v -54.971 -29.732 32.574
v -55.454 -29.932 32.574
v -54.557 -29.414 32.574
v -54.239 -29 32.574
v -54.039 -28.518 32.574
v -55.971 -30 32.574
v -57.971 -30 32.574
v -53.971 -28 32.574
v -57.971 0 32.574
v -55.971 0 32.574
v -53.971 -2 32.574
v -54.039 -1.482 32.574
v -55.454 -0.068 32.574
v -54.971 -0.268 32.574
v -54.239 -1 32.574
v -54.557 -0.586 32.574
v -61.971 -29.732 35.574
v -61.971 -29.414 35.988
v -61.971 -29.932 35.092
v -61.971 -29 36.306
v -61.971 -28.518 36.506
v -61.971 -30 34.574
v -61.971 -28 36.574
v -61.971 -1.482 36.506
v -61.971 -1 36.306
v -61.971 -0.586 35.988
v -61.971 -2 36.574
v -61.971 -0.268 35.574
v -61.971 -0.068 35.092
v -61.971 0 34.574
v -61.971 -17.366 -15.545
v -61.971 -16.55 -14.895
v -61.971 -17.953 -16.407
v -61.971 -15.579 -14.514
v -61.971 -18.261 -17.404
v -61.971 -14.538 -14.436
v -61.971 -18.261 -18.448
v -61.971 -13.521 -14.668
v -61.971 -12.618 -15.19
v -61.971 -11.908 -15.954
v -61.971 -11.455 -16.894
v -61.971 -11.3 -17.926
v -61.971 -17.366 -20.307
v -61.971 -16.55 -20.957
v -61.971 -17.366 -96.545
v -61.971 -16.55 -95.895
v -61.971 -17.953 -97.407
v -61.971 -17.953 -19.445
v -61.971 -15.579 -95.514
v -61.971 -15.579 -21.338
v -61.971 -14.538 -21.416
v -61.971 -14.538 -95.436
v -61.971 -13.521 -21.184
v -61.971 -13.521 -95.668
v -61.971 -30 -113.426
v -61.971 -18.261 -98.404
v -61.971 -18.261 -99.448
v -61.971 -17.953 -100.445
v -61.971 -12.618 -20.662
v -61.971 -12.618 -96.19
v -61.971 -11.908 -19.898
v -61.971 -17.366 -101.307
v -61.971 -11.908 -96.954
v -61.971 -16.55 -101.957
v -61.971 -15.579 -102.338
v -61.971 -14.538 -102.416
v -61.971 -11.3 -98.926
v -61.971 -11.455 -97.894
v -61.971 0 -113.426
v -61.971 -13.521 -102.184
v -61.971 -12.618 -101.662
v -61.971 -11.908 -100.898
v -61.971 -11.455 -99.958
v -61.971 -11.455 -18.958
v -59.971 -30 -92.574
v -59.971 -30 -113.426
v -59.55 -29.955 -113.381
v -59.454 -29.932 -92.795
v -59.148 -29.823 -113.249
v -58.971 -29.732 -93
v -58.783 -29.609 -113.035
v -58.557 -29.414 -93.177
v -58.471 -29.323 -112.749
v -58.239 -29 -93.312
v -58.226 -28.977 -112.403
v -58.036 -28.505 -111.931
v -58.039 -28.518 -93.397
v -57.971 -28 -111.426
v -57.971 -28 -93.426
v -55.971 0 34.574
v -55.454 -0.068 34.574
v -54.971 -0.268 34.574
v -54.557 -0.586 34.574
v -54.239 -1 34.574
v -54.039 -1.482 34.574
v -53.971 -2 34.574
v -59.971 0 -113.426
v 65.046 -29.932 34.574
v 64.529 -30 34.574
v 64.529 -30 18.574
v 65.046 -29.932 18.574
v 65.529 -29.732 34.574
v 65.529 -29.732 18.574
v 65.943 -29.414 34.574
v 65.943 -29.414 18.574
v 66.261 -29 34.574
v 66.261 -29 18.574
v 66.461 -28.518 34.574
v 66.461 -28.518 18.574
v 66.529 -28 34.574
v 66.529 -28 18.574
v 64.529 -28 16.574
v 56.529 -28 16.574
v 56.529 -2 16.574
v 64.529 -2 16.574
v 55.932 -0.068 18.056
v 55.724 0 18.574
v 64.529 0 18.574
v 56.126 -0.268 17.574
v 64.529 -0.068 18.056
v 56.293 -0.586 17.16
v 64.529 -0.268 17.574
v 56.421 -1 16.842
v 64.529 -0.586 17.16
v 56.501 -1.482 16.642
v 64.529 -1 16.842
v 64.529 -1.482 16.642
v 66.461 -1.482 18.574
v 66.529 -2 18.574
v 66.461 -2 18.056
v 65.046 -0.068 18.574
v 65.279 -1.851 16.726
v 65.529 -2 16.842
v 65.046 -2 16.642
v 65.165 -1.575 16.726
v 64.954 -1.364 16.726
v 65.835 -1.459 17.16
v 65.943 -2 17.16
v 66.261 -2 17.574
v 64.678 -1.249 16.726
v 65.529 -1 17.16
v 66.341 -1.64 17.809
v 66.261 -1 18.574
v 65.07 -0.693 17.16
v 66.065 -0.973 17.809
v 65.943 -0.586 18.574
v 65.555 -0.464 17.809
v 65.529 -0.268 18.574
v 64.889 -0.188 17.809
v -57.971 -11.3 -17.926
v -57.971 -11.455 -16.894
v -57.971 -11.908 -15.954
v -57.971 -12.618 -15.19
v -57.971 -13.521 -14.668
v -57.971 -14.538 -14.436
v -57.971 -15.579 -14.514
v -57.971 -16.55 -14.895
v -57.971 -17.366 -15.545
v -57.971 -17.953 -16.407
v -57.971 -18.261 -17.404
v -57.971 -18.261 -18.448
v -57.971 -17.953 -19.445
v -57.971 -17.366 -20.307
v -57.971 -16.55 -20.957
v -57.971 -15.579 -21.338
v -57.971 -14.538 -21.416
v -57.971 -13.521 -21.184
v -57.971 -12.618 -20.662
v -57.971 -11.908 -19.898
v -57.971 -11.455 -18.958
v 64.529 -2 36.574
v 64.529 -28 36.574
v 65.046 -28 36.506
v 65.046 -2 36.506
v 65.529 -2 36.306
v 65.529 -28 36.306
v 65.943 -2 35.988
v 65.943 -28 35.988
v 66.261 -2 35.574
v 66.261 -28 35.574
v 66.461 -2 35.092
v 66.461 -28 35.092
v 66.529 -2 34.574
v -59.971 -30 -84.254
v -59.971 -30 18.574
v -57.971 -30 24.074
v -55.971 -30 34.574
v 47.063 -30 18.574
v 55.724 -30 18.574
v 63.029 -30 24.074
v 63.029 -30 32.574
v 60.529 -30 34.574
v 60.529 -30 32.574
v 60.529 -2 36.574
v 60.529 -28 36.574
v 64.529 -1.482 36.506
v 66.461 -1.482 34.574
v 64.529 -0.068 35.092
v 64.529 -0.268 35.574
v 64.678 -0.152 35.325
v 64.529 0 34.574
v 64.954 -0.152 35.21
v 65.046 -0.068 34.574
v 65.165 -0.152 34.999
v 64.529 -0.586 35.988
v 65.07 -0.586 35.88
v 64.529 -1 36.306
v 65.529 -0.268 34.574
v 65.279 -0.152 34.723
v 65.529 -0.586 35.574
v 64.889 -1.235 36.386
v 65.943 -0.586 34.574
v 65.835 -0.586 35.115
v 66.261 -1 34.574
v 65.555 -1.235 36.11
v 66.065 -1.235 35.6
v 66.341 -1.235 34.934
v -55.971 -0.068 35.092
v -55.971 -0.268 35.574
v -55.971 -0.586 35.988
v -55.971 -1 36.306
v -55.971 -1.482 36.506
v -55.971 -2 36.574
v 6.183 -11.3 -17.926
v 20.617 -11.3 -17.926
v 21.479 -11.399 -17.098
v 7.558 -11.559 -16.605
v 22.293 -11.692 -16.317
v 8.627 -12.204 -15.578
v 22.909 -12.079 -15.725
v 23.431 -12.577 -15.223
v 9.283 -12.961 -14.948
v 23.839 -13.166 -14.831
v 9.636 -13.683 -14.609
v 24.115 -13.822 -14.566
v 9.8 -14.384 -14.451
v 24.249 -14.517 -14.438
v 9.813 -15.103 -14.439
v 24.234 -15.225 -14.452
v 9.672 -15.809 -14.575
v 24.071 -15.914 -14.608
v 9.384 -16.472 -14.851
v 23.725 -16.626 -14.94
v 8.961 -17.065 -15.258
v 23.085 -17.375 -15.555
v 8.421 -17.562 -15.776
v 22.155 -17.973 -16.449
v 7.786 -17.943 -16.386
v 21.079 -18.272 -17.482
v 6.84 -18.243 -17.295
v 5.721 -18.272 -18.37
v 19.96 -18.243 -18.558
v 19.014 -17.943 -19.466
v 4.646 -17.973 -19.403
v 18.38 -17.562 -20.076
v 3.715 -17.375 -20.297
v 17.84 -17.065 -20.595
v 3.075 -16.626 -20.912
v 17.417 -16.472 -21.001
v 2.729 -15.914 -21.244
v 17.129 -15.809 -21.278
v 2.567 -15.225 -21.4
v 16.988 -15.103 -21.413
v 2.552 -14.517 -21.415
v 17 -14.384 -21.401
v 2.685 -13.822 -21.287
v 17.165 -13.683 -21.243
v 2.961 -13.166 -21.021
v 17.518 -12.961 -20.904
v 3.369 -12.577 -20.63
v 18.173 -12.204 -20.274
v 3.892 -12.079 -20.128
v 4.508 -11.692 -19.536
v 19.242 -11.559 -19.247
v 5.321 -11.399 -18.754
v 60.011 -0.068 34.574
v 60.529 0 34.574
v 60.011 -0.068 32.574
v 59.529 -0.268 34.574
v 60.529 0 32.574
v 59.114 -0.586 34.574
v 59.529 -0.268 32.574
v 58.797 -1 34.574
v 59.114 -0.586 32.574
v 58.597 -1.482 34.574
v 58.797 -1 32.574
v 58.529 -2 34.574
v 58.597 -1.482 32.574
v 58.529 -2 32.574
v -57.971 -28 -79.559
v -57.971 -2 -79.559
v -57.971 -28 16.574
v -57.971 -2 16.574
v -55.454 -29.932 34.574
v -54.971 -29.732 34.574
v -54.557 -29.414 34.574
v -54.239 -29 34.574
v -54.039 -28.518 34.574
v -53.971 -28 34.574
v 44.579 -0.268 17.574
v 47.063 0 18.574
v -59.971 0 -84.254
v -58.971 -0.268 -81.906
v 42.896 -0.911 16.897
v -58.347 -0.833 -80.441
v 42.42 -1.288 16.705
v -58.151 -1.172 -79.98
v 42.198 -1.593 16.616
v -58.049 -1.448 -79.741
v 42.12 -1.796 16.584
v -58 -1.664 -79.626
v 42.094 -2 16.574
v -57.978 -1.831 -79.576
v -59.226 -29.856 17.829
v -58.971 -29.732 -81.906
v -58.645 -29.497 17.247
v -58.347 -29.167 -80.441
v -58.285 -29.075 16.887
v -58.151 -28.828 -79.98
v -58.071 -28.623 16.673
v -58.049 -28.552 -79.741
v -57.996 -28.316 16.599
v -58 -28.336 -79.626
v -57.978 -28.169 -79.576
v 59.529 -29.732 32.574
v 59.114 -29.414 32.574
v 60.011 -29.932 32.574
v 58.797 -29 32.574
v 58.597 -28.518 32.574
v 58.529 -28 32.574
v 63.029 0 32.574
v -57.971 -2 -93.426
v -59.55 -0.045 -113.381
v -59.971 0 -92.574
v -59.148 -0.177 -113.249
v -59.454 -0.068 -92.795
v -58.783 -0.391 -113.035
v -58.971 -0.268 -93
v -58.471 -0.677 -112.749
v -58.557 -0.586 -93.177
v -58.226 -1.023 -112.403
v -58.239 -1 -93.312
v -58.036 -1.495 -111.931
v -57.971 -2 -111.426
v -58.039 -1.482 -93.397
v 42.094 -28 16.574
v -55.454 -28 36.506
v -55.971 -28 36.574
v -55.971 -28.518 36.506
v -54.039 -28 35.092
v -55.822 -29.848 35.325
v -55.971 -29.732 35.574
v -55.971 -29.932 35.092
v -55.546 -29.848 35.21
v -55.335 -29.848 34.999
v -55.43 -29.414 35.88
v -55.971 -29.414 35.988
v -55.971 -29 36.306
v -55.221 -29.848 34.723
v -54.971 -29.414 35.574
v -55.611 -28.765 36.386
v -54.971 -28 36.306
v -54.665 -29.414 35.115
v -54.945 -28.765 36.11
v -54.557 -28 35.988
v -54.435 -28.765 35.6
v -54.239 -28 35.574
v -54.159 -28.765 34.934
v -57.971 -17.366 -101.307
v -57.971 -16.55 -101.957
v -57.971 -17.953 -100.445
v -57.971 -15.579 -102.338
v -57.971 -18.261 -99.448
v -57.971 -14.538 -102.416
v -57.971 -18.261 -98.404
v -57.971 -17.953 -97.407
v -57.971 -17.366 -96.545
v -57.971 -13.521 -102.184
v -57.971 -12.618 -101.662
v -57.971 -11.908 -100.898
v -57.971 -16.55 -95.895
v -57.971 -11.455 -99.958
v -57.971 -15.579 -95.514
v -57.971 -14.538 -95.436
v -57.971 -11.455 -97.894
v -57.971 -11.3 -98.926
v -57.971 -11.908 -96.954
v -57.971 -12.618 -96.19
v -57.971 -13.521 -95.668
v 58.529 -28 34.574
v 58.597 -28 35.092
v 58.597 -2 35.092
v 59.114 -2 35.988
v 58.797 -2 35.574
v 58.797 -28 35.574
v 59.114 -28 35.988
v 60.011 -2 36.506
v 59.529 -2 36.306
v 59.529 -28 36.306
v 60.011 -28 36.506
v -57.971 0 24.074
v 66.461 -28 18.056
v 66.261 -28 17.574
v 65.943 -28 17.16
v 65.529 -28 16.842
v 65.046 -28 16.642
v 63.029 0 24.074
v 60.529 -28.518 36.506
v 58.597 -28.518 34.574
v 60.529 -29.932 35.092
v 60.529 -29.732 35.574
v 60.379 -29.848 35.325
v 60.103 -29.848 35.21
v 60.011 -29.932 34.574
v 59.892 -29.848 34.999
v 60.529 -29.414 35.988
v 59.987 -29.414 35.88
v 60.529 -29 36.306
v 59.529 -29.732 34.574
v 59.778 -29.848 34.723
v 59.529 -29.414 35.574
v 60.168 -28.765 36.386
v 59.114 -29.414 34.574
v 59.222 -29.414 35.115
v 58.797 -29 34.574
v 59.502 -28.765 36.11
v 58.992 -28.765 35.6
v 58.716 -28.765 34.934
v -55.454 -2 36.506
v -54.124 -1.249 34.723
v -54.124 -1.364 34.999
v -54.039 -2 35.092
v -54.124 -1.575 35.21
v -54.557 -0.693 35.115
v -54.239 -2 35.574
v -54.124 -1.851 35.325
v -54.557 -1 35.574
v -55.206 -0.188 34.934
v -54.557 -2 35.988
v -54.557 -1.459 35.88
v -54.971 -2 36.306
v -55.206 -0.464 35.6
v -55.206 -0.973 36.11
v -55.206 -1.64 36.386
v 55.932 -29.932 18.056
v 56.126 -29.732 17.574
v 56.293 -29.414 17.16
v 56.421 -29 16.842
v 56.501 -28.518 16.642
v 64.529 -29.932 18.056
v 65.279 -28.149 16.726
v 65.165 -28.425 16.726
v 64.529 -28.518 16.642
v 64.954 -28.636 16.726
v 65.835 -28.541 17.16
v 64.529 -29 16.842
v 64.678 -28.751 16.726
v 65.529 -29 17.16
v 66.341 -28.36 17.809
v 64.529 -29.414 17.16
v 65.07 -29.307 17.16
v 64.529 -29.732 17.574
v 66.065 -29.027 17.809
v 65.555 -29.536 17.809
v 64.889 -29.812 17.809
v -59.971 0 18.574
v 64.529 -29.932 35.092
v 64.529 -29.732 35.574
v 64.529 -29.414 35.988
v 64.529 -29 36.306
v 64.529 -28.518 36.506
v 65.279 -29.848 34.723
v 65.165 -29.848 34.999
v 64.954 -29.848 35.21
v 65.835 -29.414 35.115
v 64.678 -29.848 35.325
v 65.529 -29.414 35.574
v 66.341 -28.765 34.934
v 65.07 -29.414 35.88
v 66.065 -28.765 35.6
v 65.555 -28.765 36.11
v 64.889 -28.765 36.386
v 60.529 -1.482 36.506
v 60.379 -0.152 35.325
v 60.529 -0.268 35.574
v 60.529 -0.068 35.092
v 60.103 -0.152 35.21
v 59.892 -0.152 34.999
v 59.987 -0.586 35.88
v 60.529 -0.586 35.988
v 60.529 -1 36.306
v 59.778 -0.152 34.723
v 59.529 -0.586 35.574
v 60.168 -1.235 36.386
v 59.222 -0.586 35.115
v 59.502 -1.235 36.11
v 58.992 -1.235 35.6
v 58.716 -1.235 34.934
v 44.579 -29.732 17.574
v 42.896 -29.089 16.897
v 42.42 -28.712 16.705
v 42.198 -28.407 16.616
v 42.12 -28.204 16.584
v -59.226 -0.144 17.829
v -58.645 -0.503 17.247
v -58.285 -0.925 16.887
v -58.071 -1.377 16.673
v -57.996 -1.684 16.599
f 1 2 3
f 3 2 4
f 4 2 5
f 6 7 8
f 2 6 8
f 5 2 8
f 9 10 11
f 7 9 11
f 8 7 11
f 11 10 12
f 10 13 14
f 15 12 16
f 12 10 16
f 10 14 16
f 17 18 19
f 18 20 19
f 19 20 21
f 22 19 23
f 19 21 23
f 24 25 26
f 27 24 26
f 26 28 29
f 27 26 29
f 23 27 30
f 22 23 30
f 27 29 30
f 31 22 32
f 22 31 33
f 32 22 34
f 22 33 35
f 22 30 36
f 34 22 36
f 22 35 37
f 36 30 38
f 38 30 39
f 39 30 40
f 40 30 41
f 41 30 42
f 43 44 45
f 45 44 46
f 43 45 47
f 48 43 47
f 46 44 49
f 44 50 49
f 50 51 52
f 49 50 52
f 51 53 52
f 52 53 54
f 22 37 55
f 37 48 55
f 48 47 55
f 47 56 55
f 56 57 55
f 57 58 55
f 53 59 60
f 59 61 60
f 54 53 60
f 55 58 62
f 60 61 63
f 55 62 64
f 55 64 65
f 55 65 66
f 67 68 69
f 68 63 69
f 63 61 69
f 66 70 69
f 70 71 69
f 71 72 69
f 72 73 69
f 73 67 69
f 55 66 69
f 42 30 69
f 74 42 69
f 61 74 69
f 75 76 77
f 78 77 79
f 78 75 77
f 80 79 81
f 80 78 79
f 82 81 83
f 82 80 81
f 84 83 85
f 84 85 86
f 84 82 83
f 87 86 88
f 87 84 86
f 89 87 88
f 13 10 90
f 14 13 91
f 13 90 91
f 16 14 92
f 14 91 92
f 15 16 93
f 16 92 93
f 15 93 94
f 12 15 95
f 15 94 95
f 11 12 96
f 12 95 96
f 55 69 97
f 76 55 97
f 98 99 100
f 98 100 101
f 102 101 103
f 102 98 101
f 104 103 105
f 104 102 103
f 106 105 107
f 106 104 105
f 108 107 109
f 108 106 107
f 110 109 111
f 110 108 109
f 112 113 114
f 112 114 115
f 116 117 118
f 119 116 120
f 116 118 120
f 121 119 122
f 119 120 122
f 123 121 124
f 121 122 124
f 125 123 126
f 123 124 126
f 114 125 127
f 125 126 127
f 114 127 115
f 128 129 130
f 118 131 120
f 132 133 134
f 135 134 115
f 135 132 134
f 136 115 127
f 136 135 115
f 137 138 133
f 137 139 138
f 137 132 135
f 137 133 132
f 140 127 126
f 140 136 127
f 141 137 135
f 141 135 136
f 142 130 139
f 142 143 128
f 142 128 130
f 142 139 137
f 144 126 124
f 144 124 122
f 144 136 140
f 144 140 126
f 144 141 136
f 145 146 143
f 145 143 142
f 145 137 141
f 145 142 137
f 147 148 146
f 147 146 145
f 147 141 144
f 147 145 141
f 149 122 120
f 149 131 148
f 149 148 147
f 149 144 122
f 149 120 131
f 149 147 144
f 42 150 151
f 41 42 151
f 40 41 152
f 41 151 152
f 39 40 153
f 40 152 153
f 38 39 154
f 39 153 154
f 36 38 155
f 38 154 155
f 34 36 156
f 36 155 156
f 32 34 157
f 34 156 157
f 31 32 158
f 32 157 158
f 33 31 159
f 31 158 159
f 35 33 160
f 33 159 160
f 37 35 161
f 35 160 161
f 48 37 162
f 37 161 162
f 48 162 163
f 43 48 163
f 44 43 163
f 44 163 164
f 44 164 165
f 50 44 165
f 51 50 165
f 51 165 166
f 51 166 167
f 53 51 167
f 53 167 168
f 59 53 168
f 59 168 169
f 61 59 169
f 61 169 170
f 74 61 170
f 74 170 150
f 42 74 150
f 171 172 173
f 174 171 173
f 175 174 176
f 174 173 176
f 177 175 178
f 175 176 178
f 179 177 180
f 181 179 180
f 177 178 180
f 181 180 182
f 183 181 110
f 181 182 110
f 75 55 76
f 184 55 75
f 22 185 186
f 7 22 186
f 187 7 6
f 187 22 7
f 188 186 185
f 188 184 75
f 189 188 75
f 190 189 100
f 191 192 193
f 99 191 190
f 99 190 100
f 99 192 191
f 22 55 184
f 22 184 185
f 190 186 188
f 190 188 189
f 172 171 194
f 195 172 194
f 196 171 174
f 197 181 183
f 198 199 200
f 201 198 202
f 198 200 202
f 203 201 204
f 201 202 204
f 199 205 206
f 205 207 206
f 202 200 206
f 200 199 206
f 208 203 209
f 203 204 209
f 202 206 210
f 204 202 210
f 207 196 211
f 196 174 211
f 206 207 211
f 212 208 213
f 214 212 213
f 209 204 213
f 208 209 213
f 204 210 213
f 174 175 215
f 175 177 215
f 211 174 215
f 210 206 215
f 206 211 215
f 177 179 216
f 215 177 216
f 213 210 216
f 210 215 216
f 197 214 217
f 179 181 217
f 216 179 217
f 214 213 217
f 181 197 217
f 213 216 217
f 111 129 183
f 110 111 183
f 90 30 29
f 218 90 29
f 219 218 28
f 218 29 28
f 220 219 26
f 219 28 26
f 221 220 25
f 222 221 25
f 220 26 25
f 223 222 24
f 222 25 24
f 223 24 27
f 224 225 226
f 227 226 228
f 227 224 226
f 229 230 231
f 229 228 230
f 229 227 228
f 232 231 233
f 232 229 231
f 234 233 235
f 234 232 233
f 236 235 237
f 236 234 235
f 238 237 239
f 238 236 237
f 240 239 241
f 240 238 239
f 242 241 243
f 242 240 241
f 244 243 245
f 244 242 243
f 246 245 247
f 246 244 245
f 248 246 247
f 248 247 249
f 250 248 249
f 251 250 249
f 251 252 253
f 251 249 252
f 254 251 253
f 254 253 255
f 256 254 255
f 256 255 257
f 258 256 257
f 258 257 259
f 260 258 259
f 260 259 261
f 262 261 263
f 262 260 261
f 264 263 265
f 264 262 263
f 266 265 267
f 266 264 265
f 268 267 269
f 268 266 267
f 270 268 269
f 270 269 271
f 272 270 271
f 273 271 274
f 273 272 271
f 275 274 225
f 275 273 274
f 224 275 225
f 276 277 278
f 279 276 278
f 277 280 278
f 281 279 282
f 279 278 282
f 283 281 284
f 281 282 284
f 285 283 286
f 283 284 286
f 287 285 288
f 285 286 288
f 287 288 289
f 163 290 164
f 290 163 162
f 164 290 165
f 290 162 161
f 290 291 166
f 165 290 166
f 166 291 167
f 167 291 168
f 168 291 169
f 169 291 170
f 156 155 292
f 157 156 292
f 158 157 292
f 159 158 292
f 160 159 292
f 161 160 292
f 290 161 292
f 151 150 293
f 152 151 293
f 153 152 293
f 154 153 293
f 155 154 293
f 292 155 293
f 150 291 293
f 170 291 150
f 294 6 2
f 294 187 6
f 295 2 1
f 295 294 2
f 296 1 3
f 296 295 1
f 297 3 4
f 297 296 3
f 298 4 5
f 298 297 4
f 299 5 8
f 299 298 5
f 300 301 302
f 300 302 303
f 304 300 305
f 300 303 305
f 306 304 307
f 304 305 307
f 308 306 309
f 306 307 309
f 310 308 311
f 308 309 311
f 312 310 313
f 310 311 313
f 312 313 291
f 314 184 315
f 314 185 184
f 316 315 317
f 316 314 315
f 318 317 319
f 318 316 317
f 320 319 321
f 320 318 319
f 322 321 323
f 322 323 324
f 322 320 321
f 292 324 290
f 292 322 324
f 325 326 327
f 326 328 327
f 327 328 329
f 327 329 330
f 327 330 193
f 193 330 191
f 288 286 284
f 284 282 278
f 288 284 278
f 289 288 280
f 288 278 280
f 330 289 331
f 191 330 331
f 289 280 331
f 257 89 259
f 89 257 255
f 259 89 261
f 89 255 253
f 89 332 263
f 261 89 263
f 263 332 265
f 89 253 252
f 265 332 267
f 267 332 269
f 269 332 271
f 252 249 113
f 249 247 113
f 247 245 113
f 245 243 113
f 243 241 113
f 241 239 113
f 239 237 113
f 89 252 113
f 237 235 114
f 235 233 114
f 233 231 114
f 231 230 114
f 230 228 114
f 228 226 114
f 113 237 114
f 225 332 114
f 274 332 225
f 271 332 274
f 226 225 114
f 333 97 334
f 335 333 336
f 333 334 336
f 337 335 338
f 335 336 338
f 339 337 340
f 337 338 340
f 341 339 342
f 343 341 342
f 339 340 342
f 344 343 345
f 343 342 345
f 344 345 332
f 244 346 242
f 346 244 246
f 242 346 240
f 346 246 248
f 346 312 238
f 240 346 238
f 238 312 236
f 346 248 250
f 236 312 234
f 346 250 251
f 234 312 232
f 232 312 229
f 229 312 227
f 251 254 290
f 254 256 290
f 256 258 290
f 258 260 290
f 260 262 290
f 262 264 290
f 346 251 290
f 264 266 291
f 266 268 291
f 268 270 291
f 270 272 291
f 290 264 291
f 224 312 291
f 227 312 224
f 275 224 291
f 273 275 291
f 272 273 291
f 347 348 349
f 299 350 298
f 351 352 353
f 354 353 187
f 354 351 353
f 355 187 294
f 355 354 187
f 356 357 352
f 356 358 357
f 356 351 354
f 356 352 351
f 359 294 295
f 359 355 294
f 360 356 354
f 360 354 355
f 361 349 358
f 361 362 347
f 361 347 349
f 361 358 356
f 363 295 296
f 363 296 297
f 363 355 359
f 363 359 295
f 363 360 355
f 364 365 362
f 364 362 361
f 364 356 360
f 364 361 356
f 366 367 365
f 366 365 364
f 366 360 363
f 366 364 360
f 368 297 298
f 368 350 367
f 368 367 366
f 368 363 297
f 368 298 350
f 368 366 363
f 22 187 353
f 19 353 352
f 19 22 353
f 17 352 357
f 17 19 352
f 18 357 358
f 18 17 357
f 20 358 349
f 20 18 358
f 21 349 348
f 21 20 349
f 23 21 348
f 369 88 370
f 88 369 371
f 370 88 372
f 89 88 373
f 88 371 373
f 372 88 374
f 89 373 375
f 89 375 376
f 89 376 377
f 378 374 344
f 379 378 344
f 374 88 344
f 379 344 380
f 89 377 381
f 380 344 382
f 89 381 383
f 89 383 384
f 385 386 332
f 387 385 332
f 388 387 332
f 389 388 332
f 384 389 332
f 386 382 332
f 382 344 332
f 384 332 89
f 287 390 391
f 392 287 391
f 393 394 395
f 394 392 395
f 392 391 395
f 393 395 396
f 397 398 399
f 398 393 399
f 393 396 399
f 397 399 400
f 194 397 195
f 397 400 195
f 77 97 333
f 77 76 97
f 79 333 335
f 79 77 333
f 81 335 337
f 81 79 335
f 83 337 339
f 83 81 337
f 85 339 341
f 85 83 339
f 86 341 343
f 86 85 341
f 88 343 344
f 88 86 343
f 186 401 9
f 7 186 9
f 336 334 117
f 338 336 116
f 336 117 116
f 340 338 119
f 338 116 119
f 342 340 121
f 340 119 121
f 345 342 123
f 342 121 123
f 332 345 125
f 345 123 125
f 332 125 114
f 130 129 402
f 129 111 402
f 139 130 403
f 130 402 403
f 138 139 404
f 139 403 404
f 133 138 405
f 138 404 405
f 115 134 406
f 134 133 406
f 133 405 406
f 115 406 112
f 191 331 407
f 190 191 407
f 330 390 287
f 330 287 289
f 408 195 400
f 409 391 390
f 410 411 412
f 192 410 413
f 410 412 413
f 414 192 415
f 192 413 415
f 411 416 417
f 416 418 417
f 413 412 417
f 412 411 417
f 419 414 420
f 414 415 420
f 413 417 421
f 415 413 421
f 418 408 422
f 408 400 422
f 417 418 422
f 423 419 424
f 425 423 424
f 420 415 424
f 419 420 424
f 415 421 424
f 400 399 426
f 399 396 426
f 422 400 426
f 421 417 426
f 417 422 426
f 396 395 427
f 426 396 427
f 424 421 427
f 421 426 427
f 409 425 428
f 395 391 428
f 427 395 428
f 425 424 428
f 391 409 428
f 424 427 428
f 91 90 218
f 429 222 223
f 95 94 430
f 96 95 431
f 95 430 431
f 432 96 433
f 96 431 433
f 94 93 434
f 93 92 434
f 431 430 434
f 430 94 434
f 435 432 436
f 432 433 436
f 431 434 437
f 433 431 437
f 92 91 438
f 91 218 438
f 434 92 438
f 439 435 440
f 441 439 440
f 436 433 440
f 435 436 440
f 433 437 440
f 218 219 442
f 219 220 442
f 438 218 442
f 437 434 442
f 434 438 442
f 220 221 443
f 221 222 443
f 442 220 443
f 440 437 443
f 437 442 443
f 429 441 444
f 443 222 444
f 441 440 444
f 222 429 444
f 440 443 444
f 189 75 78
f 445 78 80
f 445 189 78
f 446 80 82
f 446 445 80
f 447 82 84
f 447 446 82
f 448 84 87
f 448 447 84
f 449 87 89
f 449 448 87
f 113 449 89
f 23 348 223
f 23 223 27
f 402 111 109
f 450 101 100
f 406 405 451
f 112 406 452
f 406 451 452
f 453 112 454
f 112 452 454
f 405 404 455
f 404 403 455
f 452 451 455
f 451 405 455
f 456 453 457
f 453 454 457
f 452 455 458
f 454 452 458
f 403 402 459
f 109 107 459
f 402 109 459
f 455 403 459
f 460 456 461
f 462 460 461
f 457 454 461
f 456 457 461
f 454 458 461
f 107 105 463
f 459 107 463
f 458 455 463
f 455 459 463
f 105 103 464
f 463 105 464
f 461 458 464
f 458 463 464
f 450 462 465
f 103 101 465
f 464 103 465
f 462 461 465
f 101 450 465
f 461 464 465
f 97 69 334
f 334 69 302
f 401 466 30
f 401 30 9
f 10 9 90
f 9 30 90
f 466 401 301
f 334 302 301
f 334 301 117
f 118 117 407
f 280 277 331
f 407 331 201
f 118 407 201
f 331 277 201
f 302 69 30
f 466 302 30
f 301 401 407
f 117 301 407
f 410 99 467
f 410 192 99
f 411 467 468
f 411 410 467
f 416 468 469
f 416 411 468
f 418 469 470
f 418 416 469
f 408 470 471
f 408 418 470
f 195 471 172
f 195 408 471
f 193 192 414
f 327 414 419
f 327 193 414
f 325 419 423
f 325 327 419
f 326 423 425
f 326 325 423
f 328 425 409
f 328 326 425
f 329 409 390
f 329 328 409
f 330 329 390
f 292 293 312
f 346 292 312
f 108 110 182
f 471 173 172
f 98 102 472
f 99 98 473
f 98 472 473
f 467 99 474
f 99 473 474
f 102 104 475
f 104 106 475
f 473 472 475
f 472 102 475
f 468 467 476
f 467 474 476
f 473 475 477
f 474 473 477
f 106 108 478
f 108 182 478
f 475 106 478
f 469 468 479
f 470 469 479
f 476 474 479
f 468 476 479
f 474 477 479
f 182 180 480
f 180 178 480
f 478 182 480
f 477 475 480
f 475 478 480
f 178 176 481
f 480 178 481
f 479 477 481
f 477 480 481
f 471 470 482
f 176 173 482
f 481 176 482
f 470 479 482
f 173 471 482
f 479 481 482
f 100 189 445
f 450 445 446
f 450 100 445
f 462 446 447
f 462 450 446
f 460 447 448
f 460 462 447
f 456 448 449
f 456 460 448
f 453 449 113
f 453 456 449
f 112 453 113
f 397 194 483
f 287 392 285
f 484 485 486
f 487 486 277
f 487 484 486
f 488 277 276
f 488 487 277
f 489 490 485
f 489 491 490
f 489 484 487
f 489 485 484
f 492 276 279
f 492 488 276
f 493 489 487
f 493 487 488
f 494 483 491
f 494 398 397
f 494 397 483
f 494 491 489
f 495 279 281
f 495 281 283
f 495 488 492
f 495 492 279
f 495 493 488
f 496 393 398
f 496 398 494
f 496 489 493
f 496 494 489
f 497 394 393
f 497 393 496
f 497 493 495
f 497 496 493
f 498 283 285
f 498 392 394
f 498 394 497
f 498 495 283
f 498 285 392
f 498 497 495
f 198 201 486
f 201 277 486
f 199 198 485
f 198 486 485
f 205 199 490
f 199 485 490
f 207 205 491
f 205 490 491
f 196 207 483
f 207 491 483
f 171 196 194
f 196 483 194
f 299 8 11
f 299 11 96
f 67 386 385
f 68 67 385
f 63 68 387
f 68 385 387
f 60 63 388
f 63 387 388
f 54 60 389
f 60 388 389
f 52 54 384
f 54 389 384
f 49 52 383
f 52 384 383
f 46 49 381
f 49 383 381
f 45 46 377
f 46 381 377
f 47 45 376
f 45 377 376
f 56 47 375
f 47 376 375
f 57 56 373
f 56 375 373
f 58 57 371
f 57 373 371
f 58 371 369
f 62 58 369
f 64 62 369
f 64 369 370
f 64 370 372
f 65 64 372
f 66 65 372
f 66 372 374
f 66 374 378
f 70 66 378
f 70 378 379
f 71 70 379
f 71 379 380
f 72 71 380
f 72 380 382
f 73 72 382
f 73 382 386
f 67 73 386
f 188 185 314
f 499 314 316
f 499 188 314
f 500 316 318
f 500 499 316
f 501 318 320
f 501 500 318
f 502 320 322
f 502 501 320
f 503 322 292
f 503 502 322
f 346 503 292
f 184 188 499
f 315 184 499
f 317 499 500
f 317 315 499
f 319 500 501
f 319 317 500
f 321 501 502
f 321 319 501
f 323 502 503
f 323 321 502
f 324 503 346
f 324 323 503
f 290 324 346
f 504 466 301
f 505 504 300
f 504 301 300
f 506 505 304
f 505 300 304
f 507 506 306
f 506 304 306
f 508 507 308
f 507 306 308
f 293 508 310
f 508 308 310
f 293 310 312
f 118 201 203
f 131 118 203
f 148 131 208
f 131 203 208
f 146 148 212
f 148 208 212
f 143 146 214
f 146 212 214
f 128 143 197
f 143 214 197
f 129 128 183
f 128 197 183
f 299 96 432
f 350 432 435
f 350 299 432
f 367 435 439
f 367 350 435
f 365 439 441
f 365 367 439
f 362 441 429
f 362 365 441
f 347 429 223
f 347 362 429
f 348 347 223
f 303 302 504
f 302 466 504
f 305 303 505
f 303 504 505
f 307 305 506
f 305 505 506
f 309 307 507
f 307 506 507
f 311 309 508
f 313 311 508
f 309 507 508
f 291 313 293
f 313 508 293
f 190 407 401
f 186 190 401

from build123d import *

# Parameters (mm, degrees)
F1_DEPTH      = 30
F2_R          = 3.5
F3_DEPTH      = 73.1
F4_DEPTH      = 25
F4_DEPTH_BACK = 25
F5_R          = 2


with BuildPart() as f1:
    # F0 (on Front) → F1 (new body)
    with BuildSketch(Plane.XZ):
        Polygon((-57.971305, 24.073915), (-57.971305, 32.573915), (-53.971305, 32.573915), (-53.971305, 36.573915), (-61.971305, 36.573915), (-61.971305, -113.426085), (-57.971305, -113.426085), (-57.971305, -93.426085), (56.528695, 16.573915), (66.528695, 16.573915), (66.528695, 36.573915), (58.528695, 36.573915), (58.528695, 32.573915), (63.028695, 32.573915), (63.028695, 24.073915), align=None)
        Polygon((-57.971305, -79.559067), (-57.971305, 16.573915), (42.094389, 16.573915), align=None, mode=Mode.SUBTRACT)
    extrude(amount=F1_DEPTH)

    # F2 (on Right) → F3 (cut)
    with BuildSketch(Plane.YZ):
        with Locations((-14.8, -98.926085)):
            Circle(F2_R)
        with Locations((-14.8, -17.926085)):
            Circle(F2_R)
    extrude(amount=-F3_DEPTH, mode=Mode.SUBTRACT)

    # F2 (on Right) → F4 (cut, two sides)
    with BuildSketch(Plane.YZ) as f4_sk:
        with Locations((-14.8, -98.926085)):
            Circle(F2_R)
        with Locations((-14.8, -17.926085)):
            Circle(F2_R)
    extrude(amount=F4_DEPTH, mode=Mode.SUBTRACT)
    extrude(f4_sk.sketch, amount=-F4_DEPTH_BACK, mode=Mode.SUBTRACT)

    # F5
    f5_edges = [f1.edges().sort_by_distance(p)[0] for p in [
        (66.528695, -15, 36.573915),
        (58.528695, -15, 36.573915),
        (66.528695, -30, 26.573915),
        (62.528695, -30, 36.573915),
        (62.528695, 0, 36.573915),
        (66.528695, 0, 26.573915),
        (58.528695, 0, 34.573915),
        (58.528695, -30, 34.573915),
        (66.528695, -15, 16.573915),
        (61.528695, -30, 16.573915),
        (61.528695, 0, 16.573915),
        (-7.938458, -30, 16.573915),
        (-7.938458, 0, 16.573915),
        (-0.721305, -30, -38.426085),
        (-7.938458, -30, -31.492576),
        (-57.971305, -30, -31.492576),
        (-57.971305, 0, -31.492576),
        (-0.721305, 0, -38.426085),
        (-7.938458, 0, -31.492576),
        (-57.971305, -15, -113.426085),
        (-57.971305, 0, -103.426085),
        (-57.971305, -30, -103.426085),
        (-57.971305, 0, 36.573915),
        (-53.971305, 0, 34.573915),
        (-53.971305, -15, 36.573915),
        (-57.971305, -30, 36.573915),
        (-53.971305, -30, 34.573915),
    ]]
    fillet(f5_edges, radius=F5_R)


solid = f1.part
